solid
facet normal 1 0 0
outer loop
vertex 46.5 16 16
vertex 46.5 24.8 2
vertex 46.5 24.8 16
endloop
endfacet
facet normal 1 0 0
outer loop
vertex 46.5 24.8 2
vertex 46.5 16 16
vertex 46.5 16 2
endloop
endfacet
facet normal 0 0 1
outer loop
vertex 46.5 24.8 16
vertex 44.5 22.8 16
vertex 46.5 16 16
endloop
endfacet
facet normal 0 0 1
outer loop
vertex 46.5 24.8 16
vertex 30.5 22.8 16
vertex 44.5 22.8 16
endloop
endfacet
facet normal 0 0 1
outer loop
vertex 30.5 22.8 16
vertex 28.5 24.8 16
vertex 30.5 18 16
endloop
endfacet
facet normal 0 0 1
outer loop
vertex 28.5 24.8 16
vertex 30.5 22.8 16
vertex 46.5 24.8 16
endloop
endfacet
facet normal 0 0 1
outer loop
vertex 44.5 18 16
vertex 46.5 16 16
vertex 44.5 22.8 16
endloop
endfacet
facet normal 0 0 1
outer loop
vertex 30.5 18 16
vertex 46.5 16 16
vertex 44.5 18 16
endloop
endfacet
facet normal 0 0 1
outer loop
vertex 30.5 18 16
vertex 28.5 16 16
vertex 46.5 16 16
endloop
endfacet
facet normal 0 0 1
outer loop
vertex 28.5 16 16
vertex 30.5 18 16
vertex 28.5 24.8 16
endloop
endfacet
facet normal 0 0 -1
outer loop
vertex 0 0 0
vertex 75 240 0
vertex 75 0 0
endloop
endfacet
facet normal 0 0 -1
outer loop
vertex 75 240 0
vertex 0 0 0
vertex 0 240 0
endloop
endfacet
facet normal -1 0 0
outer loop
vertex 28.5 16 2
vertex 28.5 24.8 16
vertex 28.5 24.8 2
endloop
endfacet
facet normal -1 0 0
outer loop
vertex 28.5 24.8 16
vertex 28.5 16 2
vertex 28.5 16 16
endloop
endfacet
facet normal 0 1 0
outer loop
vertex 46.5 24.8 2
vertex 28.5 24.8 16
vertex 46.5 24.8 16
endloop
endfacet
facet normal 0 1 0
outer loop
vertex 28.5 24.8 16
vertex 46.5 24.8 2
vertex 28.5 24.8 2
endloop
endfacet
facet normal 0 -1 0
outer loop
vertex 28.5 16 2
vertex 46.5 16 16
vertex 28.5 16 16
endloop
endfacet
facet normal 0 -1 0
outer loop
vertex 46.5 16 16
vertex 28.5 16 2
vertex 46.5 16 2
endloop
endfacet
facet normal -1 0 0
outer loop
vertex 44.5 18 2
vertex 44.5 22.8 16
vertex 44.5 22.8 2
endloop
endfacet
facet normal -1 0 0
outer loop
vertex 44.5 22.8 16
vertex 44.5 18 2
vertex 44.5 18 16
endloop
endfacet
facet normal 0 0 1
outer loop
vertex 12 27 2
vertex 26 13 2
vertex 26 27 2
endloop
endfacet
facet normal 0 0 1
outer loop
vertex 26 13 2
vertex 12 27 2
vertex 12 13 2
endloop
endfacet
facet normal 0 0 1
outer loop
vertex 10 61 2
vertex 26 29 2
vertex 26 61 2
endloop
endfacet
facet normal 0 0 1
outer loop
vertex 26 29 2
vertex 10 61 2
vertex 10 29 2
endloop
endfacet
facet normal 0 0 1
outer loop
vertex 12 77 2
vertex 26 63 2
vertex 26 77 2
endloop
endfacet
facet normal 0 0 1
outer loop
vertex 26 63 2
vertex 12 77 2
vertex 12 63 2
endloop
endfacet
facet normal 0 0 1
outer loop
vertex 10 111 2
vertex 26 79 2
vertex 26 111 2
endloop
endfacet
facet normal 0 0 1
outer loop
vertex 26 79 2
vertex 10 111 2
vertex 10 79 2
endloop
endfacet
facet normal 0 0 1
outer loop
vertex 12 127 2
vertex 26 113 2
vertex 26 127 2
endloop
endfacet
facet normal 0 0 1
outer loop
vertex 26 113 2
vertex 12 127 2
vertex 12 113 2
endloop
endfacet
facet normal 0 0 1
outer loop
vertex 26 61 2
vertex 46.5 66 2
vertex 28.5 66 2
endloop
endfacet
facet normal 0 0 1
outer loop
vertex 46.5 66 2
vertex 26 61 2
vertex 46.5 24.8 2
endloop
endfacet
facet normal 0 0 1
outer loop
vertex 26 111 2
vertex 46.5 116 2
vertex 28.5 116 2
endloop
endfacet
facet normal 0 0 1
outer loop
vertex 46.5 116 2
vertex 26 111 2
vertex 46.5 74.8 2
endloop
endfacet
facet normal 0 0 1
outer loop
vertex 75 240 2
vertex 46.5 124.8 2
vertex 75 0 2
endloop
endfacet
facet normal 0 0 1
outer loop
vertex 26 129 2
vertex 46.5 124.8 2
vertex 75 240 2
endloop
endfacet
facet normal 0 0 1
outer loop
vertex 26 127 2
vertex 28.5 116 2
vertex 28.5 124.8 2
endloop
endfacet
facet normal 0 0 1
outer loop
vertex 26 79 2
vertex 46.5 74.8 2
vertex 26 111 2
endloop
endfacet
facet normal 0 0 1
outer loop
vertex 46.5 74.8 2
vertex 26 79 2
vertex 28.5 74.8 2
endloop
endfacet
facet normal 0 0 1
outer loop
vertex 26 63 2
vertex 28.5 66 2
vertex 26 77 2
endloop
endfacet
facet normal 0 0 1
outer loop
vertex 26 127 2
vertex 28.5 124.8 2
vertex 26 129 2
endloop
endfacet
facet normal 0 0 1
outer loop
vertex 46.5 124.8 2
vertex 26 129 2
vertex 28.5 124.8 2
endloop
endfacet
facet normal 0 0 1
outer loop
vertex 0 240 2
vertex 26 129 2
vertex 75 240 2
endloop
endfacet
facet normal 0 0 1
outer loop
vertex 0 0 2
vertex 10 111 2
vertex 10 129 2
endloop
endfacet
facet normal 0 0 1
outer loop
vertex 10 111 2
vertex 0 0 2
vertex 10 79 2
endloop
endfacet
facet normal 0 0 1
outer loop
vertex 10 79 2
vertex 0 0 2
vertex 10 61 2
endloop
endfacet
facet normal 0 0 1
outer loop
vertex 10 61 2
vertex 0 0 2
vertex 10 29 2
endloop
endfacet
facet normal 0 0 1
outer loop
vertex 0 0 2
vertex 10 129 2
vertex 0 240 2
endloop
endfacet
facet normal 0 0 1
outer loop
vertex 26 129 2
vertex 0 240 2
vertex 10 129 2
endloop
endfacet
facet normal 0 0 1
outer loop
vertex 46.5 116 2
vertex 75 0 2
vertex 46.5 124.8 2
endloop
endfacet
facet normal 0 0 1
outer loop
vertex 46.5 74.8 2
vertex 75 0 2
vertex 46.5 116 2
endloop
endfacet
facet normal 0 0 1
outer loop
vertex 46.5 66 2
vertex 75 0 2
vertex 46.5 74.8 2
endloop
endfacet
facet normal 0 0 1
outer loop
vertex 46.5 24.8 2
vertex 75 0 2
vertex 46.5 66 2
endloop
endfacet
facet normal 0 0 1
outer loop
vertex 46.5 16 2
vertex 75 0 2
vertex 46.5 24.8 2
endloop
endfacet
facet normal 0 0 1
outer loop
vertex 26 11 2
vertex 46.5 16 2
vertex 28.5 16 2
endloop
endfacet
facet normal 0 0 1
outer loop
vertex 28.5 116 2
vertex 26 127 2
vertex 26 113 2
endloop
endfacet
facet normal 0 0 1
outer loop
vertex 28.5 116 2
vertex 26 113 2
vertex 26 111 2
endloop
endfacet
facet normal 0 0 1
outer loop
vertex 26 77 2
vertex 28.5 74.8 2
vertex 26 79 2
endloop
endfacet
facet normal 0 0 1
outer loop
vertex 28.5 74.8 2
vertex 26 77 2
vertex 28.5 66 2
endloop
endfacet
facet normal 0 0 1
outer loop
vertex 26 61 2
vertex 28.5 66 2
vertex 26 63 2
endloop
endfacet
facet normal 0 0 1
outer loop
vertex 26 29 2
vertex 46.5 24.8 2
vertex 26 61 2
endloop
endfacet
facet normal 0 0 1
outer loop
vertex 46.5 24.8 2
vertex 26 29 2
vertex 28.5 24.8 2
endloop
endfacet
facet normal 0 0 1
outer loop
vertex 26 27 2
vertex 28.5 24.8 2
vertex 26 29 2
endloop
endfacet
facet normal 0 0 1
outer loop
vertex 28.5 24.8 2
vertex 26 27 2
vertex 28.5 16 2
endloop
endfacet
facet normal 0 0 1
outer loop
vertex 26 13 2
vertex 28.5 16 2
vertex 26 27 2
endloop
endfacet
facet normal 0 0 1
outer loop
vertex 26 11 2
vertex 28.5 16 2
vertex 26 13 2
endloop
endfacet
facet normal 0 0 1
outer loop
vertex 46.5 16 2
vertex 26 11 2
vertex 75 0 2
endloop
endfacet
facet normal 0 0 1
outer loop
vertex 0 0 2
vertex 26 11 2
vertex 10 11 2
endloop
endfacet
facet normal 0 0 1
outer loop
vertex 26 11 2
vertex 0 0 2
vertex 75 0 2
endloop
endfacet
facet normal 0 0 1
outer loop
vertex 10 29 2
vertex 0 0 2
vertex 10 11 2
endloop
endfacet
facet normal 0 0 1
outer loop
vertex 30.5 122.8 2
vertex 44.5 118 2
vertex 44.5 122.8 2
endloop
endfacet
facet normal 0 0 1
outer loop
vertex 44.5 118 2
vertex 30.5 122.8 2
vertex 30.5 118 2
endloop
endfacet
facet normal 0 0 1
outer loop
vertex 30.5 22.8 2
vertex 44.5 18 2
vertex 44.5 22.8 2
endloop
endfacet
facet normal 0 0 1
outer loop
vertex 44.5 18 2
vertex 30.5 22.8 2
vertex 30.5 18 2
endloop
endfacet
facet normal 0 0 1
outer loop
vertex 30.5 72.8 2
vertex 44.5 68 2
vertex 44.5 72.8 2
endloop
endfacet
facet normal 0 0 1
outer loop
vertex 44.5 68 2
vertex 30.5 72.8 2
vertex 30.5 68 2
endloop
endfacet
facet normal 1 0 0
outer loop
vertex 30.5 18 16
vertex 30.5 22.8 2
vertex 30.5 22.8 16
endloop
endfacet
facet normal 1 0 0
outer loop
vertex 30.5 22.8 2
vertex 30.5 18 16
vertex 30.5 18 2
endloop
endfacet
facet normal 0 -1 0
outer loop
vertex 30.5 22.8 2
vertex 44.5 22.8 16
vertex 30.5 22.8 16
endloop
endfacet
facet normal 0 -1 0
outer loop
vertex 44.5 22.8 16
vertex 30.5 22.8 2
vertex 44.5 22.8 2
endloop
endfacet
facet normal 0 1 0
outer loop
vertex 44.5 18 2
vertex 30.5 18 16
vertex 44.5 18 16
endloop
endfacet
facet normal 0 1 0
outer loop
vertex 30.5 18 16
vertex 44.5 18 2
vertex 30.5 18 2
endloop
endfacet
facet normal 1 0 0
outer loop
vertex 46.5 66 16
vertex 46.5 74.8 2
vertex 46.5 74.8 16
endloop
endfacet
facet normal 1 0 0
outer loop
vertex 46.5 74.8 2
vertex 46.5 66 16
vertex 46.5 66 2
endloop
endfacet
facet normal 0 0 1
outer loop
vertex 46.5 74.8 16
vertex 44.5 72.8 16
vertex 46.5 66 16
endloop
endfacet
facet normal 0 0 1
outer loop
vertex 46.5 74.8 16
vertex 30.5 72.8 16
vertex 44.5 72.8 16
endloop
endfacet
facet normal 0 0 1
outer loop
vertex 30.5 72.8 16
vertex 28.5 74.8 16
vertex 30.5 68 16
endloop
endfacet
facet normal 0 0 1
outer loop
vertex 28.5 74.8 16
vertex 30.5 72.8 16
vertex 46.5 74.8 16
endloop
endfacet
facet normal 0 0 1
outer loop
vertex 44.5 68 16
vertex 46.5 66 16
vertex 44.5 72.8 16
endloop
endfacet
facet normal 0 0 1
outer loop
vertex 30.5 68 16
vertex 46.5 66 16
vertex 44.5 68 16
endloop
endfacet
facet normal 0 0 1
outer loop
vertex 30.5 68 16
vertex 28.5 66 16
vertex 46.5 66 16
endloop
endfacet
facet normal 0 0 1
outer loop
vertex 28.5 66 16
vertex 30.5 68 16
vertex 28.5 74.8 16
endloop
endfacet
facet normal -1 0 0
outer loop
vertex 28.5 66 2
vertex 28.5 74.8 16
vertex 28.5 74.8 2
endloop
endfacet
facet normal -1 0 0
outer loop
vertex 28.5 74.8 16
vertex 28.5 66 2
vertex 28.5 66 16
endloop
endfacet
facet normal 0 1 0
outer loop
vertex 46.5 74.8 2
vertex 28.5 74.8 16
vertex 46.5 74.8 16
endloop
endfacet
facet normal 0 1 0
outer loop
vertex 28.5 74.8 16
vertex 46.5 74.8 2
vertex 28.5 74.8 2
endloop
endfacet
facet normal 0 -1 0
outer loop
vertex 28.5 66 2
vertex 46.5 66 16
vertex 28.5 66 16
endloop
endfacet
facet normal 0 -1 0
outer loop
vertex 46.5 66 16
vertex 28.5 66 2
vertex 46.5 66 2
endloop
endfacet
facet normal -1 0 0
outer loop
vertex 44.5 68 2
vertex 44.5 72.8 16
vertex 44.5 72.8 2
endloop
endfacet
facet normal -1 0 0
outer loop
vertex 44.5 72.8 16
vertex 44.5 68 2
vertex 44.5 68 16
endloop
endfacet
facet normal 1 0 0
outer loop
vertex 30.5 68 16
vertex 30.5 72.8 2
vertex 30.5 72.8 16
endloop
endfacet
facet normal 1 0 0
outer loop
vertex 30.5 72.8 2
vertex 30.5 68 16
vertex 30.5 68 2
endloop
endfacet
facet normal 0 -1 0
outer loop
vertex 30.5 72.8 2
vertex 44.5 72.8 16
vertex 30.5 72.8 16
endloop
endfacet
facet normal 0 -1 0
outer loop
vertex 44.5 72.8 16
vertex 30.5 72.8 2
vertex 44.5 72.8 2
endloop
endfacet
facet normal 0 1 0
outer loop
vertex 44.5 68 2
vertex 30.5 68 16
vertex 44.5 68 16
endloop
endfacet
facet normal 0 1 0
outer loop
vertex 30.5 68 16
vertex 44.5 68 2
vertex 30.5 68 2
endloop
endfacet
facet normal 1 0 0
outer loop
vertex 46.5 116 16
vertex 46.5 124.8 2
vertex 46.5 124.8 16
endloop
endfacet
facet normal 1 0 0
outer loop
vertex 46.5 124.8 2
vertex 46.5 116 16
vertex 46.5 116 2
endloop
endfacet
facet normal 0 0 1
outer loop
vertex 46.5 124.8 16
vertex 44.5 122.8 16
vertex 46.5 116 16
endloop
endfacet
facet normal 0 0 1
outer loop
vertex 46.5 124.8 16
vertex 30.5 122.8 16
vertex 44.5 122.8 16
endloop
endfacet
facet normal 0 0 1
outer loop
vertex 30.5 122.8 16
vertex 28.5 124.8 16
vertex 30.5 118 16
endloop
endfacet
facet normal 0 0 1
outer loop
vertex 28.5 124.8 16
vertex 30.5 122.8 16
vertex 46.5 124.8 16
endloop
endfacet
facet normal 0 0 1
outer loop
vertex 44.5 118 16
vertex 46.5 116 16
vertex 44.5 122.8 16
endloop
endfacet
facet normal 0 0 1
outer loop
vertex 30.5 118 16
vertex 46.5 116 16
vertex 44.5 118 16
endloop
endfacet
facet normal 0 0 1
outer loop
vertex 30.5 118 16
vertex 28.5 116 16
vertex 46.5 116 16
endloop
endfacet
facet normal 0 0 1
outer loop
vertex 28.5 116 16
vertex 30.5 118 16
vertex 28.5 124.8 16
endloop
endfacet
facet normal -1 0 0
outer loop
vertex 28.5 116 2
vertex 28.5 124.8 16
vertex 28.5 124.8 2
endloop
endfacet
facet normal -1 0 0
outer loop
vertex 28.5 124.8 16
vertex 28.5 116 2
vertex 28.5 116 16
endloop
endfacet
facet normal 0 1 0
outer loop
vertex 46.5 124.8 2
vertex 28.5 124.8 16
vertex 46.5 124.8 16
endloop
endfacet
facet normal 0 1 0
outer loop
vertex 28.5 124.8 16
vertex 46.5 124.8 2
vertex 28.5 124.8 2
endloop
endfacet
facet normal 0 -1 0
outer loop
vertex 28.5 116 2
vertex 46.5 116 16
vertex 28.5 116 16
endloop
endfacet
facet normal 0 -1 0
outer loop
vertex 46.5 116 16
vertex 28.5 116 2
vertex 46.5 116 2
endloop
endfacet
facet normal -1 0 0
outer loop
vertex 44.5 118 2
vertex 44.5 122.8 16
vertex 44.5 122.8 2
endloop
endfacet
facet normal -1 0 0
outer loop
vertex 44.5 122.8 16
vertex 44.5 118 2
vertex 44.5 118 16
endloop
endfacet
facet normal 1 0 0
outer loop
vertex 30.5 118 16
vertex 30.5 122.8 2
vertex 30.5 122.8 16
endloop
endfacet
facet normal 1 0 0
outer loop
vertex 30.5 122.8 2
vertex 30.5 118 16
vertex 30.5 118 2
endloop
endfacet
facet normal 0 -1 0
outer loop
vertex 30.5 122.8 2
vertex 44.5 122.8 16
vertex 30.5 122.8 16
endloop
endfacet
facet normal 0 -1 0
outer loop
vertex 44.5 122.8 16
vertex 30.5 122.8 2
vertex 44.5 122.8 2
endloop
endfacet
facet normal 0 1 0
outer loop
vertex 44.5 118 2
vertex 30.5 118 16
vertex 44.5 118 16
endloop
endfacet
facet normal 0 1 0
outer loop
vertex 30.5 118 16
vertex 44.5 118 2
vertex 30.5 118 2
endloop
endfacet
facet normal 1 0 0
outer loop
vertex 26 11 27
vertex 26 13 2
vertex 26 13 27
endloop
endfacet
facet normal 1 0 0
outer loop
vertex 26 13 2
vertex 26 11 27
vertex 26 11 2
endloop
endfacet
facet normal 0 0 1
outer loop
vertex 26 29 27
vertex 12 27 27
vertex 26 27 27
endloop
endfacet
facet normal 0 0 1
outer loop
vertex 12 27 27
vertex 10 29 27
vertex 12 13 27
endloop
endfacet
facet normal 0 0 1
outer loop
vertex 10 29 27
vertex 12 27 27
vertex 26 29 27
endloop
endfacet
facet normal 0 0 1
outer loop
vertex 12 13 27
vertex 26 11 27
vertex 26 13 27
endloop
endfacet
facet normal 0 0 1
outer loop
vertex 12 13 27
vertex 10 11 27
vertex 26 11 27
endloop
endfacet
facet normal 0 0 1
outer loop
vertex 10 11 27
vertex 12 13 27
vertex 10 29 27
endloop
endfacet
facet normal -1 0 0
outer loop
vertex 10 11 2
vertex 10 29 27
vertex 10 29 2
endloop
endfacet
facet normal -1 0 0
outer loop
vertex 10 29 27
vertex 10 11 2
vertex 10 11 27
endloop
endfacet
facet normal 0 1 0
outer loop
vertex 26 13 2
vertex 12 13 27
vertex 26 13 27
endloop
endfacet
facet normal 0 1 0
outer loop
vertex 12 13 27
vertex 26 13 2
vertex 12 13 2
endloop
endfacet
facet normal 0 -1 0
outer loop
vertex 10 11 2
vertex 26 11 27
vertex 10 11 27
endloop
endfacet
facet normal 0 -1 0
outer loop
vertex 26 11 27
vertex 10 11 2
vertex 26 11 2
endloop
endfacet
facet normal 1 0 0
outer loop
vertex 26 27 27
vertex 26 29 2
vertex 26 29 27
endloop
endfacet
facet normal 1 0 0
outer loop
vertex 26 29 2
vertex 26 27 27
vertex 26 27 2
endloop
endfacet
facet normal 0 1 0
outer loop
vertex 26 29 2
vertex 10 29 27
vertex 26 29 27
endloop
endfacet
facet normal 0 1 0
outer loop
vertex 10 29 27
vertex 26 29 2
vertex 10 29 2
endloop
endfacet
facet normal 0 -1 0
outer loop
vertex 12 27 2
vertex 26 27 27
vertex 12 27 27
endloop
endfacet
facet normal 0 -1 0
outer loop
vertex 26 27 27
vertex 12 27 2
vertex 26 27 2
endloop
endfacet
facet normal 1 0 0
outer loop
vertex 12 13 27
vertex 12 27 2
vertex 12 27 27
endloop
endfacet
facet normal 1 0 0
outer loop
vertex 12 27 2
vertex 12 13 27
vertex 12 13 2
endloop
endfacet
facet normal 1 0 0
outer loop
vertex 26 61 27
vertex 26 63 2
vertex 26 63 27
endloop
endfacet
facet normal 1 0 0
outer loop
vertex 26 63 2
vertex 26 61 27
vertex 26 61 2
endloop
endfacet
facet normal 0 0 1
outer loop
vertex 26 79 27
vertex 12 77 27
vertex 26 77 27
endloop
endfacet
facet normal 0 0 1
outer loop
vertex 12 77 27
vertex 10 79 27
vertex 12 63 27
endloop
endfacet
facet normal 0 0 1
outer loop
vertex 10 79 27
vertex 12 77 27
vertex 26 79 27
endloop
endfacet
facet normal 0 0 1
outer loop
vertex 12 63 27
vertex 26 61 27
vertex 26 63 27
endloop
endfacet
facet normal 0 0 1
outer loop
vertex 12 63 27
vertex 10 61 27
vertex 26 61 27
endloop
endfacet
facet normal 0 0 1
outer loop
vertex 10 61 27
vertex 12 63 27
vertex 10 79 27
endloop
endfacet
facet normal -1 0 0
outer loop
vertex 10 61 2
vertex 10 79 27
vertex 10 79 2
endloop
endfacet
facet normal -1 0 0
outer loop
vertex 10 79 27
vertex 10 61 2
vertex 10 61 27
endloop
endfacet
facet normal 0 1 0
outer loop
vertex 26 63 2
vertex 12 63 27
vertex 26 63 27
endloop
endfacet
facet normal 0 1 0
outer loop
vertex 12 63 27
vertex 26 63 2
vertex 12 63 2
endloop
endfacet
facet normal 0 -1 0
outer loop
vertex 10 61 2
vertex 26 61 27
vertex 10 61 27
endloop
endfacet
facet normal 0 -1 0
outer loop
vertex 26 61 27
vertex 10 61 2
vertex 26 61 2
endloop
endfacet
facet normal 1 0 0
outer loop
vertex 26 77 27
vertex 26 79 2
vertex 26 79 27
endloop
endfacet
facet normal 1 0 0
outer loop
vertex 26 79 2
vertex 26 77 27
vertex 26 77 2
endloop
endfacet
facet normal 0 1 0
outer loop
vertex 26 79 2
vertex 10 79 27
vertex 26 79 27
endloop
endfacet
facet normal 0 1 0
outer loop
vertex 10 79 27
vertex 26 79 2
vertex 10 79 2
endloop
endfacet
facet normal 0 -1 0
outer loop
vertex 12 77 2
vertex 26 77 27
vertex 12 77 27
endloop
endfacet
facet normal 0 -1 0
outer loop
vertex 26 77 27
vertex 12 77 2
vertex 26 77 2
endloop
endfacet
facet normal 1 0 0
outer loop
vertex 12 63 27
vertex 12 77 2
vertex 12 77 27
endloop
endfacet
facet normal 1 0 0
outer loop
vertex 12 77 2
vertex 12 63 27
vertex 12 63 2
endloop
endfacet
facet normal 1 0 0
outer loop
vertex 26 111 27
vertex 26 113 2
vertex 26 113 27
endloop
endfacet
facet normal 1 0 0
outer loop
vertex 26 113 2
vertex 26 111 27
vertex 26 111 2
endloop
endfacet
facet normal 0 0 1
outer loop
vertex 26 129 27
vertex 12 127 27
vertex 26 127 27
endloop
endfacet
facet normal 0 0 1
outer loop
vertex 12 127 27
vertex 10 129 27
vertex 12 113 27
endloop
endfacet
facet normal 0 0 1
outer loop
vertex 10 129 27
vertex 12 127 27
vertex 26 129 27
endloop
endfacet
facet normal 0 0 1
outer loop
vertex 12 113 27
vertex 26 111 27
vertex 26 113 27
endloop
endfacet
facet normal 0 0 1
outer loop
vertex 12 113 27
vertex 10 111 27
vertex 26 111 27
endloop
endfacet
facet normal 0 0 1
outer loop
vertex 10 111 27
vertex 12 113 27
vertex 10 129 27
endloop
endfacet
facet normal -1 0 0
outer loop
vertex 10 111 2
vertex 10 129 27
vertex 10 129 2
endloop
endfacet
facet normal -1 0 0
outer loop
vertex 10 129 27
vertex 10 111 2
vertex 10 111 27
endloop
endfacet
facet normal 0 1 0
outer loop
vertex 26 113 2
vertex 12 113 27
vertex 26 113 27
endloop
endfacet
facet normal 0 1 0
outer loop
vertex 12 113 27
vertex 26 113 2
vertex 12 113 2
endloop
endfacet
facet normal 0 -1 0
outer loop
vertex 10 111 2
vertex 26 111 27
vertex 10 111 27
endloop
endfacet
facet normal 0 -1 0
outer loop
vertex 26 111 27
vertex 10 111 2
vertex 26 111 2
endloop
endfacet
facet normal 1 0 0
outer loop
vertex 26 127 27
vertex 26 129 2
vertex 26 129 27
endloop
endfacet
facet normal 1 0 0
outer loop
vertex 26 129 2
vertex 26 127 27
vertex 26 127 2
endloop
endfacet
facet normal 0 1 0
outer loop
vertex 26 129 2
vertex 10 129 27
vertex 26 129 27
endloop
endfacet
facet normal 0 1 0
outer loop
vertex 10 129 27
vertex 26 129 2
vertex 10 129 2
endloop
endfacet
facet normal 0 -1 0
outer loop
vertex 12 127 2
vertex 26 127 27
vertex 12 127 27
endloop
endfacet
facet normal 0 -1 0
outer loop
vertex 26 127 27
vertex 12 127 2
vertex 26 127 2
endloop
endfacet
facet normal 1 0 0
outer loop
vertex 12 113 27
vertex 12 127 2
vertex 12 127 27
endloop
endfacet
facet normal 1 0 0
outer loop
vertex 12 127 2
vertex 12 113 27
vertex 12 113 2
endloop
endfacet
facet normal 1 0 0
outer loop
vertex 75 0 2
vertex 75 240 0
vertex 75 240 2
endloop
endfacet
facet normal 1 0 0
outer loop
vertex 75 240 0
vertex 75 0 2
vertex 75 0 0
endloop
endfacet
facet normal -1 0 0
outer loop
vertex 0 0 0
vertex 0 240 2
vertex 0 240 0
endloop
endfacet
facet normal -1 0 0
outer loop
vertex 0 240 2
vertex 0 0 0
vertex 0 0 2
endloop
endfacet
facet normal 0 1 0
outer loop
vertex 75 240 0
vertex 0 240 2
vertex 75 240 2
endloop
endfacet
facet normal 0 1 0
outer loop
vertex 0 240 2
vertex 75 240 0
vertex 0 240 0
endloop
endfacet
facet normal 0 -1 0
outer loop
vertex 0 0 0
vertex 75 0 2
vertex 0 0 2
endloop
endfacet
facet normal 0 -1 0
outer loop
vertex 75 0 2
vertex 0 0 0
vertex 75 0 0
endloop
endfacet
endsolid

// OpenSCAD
module open_top_box(size, wall=2){
    // Form the dimensions of the outer box
    x2 = size[0] + wall*2;
    y2 = size[1] + wall*2;
    z2 = size[2] + wall*2;

    echo("Not building with lid");
    zWall = size[2] + wall*2;
    lid_offset = [wall, wall, wall];

    difference(){
        cube([x2,y2,z2]);
        translate(lid_offset){
            cube([size.x, size.y, zWall]);
        }       
    }
}

hdmi_x = 14;
hdmi_y = 4.8;
hdmi_z = 12;

// Want at lest 2 times the width to support
base_x = 75;

// Want at least 10mm space between them
base_y = hdmi_y*50;
base_z = 2;

offset_x = (base_x - hdmi_x)/2;
center_x = (base_x / 2) - ((hdmi_x + 4) / 2);

// Define the base
cube([base_x, 50*hdmi_y,2]);

/* Prototype base 
//cube([base_x, 40, .5]);

translate([0,14,0]){
    translate([center_x,2,0]){
        open_top_box(size=[hdmi_x, hdmi_y, 10]);
    }
}
/* End prototype base */


translate([0,14,0]){
    // Mini-PC mount 1
    translate([center_x,2,0]){
        open_top_box(size=[hdmi_x, hdmi_y, hdmi_z], wall=2, lid=false);
    }
    // Mini-PC mount 2
    translate([center_x,2+50,0]){
        open_top_box(size=[hdmi_x, hdmi_y, hdmi_z], wall=2, lid=false);
    }
    // Mini-PC mount 3
    translate([center_x,2+100,0]){
        open_top_box(size=[hdmi_x, hdmi_y, hdmi_z], wall=2, lid=false);
    }
}

slot_height = 27;

// 1st Mount
translate([5,0,0]){
    translate([5,11,0]){
        cube([16,2,slot_height]);
    }
    translate([5,27,0]){
        cube([16,2,slot_height]);
    }
    translate([5,11,0]){
        cube([2,18,slot_height]);
    }
}

// 2nd Mount
translate([5,50,0]){
    translate([5,11,0]){
        cube([16,2,slot_height]);
    }
    translate([5,27,0]){
        cube([16,2,slot_height]);
    }
    translate([5,11,0]){
        cube([2,18,slot_height]);
    }
}


// 3rd Mount
translate([5,100,0]){
    translate([5,11,0]){
        cube([16,2,slot_height]);
    }
    translate([5,27,0]){
        cube([16,2,slot_height]);
    }
    translate([5,11,0]){
        cube([2,18,slot_height]);
    }
}


// 4th Mount
translate([5,100,0]){
    translate([5,11,0]){
        cube([16,2,slot_height]);
    }
    translate([5,27,0]){
        cube([16,2,slot_height]);
    }
    translate([5,11,0]){
        cube([2,18,slot_height]);
    }
}


// 5th Mount
translate([5,100,0]){
    translate([5,11,0]){
        cube([16,2,slot_height]);
    }
    translate([5,27,0]){
        cube([16,2,slot_height]);
    }
    translate([5,11,0]){
        cube([2,18,slot_height]);
    }
}
